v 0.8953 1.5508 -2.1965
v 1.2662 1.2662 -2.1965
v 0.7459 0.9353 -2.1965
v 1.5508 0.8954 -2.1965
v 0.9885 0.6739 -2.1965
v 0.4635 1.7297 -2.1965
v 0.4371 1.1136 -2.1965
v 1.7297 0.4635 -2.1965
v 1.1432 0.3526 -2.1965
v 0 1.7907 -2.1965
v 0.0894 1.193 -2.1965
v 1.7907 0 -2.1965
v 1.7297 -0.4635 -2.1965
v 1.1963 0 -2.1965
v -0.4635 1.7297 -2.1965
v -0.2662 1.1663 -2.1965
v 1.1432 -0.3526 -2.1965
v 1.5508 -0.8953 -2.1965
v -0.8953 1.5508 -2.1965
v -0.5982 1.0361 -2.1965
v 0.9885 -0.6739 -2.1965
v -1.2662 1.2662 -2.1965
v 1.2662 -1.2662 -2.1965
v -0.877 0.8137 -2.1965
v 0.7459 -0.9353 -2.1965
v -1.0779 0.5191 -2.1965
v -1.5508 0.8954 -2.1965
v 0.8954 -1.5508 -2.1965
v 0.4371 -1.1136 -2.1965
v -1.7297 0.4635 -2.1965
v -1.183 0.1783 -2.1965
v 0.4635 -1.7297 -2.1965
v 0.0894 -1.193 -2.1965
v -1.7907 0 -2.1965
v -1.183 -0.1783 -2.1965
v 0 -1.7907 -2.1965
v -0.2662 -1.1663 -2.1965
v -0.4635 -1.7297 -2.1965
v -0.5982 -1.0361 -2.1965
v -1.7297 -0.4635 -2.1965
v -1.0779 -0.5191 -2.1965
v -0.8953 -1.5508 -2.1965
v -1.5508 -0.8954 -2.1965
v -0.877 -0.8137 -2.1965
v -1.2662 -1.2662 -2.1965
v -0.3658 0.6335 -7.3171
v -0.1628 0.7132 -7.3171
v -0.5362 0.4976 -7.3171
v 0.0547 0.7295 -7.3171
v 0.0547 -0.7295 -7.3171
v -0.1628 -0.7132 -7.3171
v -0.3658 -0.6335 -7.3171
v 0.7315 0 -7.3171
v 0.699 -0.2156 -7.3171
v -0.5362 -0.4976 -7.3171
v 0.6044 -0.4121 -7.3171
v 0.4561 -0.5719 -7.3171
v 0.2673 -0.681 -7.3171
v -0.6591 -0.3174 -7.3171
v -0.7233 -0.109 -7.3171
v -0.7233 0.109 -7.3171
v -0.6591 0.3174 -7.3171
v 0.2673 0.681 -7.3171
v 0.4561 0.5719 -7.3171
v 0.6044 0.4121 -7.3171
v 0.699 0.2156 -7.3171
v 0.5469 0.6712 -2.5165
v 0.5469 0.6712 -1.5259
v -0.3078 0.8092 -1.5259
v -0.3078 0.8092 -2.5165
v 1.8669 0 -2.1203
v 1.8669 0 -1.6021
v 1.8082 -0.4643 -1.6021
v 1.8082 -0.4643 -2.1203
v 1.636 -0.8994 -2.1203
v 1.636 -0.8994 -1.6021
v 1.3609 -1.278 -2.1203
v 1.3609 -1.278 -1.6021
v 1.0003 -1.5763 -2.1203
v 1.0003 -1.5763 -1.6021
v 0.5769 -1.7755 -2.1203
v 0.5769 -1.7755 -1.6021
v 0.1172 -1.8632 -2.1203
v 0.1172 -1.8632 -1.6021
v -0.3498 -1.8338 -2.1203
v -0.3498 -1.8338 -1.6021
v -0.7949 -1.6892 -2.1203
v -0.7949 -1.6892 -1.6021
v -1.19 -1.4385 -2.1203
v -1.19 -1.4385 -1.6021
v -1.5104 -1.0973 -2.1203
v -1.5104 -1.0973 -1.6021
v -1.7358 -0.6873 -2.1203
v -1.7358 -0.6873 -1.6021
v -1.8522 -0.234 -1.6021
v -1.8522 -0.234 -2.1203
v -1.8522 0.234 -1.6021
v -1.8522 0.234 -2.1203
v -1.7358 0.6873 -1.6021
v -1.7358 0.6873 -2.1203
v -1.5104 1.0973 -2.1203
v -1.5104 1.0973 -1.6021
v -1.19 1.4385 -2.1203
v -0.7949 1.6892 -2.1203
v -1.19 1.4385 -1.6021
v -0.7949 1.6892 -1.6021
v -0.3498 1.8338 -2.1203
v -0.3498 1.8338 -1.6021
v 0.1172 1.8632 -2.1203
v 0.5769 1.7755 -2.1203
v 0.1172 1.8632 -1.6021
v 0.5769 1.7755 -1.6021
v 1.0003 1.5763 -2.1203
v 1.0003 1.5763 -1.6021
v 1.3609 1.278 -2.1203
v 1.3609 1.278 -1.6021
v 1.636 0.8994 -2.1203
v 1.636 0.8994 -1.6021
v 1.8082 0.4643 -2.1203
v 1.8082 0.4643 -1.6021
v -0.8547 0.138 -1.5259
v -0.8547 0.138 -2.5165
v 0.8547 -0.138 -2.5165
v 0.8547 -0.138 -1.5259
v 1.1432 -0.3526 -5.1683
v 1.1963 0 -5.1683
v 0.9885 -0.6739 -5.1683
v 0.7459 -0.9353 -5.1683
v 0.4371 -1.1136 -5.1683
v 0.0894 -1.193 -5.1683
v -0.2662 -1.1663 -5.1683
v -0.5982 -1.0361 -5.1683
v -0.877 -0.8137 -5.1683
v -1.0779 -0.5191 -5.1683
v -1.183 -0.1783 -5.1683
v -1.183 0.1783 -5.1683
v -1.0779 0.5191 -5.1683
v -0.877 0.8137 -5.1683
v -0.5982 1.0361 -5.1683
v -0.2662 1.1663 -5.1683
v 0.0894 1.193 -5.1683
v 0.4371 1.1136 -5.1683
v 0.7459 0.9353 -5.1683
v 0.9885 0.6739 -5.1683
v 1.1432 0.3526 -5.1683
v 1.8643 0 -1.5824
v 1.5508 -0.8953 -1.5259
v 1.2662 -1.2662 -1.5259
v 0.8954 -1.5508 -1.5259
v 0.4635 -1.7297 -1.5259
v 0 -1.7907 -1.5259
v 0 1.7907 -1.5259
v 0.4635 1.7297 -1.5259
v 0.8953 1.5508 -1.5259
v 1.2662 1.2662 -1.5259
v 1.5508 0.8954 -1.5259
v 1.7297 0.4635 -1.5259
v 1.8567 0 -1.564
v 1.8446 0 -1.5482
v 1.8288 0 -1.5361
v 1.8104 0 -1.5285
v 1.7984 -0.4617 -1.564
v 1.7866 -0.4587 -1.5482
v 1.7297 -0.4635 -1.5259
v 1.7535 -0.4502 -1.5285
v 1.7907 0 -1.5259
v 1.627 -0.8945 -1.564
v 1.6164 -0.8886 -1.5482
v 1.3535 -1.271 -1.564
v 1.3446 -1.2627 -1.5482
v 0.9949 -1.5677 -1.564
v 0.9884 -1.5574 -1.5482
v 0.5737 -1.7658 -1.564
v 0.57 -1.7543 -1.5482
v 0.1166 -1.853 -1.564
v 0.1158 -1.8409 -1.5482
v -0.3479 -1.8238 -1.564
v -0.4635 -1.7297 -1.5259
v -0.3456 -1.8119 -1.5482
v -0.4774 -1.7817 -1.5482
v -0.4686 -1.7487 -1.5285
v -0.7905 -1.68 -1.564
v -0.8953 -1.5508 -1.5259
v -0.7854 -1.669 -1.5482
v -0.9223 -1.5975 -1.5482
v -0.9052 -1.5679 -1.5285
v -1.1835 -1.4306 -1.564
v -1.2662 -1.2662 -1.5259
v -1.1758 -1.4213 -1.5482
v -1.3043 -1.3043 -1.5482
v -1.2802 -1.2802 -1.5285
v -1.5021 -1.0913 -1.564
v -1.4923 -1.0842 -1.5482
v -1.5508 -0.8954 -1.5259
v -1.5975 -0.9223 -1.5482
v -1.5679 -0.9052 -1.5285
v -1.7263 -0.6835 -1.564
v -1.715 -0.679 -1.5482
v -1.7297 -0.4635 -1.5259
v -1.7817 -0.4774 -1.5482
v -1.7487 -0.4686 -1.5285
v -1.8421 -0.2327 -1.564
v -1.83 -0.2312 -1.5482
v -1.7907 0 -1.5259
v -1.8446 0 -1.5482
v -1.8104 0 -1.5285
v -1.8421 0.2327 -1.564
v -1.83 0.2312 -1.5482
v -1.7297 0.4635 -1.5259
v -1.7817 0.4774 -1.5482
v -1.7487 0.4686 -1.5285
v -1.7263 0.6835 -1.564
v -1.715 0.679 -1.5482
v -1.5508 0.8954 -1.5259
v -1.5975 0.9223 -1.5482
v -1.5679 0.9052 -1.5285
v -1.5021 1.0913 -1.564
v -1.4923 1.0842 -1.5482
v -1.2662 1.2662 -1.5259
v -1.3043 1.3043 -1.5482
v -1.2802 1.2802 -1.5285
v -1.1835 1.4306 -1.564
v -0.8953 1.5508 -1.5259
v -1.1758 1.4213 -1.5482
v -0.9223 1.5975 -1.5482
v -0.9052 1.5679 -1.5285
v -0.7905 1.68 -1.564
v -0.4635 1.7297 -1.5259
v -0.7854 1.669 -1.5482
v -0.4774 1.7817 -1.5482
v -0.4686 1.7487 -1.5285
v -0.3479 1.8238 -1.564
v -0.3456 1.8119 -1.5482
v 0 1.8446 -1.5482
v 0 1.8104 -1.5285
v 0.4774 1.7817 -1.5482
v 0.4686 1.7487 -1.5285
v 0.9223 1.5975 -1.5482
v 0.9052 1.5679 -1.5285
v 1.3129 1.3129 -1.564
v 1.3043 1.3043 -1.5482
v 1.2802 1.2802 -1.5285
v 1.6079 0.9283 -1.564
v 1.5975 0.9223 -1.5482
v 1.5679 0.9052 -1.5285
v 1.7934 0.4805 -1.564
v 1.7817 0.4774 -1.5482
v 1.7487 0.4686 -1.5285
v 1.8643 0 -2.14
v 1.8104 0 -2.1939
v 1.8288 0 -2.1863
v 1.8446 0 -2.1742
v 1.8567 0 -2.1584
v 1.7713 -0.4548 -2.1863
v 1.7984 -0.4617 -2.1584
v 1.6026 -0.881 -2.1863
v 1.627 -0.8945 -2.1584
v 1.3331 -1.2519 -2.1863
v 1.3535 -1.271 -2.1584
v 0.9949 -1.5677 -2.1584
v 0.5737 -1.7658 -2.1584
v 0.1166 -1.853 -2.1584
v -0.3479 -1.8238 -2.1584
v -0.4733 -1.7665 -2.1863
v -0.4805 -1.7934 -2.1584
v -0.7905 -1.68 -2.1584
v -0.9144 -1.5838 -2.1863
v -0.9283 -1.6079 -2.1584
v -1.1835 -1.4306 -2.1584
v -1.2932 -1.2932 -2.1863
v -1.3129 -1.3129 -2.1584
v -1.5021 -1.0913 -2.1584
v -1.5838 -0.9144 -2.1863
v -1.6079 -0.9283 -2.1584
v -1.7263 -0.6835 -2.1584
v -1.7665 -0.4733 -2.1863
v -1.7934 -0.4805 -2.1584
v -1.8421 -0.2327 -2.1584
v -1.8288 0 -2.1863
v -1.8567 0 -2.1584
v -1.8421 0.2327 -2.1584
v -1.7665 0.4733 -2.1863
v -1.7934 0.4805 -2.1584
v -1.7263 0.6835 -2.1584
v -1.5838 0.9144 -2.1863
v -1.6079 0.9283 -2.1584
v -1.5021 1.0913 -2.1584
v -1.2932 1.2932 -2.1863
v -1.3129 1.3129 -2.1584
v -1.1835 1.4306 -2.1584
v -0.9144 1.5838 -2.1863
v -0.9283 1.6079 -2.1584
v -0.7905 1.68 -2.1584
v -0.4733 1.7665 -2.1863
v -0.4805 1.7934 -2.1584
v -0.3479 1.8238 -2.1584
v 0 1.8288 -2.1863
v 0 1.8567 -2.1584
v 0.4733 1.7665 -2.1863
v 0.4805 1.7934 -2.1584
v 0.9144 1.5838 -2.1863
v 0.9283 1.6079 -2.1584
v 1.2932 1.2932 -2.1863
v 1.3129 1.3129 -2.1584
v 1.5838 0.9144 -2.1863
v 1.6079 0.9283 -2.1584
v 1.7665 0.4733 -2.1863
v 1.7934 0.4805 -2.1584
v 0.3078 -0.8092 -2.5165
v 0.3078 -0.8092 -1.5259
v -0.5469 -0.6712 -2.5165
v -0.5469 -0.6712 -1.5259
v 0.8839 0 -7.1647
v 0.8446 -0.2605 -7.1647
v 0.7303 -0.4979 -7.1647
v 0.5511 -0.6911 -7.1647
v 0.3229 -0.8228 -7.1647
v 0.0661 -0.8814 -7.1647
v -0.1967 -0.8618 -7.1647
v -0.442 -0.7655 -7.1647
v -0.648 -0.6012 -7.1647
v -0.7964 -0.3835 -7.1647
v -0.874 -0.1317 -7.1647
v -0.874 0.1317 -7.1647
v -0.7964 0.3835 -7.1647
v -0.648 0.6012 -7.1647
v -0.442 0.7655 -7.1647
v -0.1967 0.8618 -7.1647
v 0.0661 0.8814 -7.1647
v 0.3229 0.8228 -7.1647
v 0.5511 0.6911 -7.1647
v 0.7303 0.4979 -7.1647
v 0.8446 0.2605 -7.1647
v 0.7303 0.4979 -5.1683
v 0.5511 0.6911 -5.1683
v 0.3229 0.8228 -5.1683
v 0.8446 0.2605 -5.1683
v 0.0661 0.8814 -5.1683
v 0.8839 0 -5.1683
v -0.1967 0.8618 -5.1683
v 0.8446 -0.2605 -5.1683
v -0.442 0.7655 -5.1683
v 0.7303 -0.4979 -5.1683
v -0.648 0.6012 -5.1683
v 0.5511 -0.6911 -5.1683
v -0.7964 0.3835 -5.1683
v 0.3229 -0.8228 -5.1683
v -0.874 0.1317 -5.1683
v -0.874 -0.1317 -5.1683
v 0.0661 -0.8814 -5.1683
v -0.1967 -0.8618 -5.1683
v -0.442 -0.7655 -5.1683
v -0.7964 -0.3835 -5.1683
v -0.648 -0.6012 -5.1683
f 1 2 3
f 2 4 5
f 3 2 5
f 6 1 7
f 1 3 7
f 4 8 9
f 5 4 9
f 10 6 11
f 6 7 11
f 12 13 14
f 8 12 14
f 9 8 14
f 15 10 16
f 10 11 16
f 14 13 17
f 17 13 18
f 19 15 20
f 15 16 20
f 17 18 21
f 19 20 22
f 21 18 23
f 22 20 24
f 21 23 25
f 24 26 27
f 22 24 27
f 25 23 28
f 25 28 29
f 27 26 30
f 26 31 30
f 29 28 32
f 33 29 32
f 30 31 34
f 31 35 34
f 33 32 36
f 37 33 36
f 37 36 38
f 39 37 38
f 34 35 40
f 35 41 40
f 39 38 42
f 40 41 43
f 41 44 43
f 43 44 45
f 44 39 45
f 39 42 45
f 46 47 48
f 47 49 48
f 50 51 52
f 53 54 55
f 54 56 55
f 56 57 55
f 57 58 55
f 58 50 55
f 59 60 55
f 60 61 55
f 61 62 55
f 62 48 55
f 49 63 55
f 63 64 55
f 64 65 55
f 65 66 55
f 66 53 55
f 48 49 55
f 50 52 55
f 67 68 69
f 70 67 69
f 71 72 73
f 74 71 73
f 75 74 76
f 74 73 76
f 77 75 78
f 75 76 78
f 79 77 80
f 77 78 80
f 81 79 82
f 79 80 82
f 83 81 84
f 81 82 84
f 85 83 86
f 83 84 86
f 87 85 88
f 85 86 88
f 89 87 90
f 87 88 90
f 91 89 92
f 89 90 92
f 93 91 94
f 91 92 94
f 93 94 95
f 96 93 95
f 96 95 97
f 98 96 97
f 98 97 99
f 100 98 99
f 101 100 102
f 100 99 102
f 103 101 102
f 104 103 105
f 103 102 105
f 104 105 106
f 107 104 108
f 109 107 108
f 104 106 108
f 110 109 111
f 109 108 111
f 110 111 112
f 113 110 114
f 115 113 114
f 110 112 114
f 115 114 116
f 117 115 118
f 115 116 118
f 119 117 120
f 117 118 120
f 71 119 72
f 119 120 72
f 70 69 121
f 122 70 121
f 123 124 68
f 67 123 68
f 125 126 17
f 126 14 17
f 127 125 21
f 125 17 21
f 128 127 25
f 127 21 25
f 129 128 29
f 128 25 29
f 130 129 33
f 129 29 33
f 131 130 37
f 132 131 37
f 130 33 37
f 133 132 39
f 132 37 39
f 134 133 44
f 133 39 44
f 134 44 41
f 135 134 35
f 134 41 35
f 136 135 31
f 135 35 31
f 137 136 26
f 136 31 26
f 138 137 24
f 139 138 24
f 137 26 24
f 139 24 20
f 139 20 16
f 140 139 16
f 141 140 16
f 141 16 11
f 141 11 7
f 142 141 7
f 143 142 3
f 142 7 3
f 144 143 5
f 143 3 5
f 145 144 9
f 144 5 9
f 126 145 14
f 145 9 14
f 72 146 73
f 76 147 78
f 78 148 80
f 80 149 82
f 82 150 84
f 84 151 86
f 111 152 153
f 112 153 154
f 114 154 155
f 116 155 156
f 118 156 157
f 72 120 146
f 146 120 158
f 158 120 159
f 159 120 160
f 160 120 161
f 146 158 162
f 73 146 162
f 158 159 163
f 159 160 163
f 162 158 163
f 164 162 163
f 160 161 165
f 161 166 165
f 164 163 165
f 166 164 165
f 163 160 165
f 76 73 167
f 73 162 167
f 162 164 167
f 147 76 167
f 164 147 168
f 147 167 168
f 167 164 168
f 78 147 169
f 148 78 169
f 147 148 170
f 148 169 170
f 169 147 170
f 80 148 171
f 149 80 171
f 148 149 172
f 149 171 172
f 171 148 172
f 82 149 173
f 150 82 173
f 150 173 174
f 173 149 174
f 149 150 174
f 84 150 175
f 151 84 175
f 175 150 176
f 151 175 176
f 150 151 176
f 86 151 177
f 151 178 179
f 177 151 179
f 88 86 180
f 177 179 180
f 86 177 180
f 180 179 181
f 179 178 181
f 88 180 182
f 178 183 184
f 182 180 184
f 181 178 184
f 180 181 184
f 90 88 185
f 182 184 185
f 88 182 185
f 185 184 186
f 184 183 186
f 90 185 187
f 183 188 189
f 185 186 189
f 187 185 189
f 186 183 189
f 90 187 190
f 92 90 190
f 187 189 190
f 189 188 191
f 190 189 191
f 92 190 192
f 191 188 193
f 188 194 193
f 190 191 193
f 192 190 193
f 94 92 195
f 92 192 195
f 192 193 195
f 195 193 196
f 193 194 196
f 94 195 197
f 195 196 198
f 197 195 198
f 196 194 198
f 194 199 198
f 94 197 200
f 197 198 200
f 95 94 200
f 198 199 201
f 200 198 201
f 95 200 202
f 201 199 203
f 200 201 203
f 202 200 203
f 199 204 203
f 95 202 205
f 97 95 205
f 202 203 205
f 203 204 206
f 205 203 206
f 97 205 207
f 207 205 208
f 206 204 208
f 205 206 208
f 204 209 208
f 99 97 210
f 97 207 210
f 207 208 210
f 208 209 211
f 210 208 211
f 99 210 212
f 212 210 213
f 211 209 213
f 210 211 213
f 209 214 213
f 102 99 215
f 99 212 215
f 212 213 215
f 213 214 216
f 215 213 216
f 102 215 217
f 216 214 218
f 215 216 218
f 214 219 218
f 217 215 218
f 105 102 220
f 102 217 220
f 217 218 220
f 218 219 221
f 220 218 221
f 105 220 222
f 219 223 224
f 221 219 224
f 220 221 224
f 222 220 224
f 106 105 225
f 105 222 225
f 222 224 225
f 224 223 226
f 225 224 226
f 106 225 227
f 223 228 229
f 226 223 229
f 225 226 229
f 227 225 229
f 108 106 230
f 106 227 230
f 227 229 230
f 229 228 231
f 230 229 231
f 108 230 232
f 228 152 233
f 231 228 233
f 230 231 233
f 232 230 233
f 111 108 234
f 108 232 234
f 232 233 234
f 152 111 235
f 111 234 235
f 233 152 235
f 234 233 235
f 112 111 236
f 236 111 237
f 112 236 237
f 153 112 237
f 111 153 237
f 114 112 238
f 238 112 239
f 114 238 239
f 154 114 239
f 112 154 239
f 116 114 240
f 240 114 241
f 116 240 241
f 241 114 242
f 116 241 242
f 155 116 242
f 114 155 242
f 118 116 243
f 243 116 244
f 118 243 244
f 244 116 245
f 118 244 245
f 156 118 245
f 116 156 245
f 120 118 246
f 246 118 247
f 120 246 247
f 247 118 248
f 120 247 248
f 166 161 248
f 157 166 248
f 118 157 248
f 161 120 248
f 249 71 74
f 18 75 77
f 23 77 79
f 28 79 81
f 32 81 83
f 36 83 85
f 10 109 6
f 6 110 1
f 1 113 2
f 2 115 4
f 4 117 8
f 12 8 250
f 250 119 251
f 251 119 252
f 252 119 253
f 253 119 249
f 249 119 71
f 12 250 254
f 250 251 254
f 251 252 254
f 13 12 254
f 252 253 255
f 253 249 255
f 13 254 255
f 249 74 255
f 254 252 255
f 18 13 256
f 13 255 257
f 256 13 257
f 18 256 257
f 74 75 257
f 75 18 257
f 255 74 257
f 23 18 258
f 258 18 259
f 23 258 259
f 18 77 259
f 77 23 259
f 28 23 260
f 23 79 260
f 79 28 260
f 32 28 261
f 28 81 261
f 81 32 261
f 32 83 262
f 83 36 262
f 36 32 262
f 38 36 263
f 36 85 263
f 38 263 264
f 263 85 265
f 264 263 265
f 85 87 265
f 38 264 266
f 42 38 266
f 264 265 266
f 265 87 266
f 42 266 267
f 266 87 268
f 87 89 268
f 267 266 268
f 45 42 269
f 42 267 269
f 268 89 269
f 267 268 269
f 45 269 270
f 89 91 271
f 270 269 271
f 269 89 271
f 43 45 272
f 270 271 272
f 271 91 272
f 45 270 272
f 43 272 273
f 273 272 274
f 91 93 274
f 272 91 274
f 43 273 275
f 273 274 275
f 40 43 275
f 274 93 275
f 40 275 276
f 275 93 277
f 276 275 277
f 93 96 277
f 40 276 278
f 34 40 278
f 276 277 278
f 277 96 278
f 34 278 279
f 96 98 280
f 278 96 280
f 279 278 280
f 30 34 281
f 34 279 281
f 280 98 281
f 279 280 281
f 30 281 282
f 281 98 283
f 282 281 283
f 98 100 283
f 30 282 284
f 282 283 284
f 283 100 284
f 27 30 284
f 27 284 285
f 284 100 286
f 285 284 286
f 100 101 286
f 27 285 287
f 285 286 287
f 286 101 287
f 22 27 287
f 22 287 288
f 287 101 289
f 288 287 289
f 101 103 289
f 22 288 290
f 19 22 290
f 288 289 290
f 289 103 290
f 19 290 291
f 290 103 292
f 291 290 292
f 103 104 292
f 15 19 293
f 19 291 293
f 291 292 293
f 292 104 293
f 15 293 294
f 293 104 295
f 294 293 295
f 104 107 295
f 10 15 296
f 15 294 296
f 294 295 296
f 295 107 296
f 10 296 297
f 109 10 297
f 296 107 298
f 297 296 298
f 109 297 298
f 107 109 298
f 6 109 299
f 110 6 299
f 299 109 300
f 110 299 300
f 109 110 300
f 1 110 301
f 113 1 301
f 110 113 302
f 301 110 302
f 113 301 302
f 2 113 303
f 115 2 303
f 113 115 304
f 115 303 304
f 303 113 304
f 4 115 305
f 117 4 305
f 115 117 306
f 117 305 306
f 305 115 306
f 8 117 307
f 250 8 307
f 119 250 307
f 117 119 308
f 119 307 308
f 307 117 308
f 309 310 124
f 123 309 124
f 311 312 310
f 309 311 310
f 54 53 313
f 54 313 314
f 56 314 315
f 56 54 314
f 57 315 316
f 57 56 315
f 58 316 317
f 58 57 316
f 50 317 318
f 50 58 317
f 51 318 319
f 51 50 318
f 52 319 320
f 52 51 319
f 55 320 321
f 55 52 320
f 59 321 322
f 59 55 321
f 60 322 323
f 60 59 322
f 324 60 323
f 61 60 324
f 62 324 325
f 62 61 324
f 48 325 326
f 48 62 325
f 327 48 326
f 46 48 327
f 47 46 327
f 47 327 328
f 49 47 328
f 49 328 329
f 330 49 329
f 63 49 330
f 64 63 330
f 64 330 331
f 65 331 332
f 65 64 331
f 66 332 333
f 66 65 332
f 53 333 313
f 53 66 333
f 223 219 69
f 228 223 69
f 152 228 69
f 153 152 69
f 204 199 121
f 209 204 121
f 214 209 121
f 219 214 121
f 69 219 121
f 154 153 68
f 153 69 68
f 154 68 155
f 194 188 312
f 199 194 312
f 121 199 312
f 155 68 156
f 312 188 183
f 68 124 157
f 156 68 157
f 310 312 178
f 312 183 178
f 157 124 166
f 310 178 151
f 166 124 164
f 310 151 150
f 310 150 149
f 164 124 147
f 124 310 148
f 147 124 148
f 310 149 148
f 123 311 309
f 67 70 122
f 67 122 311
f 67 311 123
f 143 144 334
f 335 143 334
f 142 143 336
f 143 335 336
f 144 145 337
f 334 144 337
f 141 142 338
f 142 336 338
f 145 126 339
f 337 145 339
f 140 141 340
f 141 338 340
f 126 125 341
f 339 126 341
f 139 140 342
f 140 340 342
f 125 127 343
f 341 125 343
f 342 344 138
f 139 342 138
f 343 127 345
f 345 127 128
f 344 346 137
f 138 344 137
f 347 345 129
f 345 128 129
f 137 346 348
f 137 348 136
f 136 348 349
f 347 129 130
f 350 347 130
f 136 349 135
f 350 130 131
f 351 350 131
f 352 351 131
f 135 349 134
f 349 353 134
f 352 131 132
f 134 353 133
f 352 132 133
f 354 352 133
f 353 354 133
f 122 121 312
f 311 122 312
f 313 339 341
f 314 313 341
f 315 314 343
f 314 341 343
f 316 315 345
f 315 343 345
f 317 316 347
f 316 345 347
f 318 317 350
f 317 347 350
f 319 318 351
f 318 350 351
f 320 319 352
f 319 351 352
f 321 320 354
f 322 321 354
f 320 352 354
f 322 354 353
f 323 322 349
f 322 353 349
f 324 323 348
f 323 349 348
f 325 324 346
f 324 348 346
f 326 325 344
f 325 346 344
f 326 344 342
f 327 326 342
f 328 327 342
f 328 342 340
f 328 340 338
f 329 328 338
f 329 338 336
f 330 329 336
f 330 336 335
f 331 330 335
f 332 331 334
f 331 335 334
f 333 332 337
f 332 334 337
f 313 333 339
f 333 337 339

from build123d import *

# Parameters (mm, degrees)
CUT_EXTRUDE1_DEPTH = 1.651
FILLET1_R          = 0.127
CHAMFER1_SIZE      = 0.254
SCALE1_SCALE       = 0.6


with BuildPart() as part:
    # Sketch1 → Revolve1 (revolve)
    with BuildSketch(Plane(origin=(0, 0, 0), x_dir=(0, 0, -1), z_dir=(1, 0, 0)), mode=Mode.PRIVATE) as revolve1_sk:
        Polygon((0, 0), (9.652, 0), (9.652, 1.4732), (6.0706, 1.4732), (6.0706, 1.9939), (1.1176, 1.9939), (1.1176, 3.1115), (0, 3.1115), align=None)
    revolve(revolve1_sk.sketch.rotate(Axis((0, 0, 0), (0, 0, -1)), 90), axis=Axis((0, 0, 0), (0, 0, -1)))

    # Sketch2 → Cut-Extrude1 (cut)
    with BuildSketch(Plane.XY):
        Polygon((-0.911507965, -1.118668866), (0.513041674, -1.348723487), (1.424549639, -0.23005462), (0.911507965, 1.118668866), (-0.513041674, 1.348723487), (-1.424549639, 0.23005462), align=None)
    extrude(amount=-CUT_EXTRUDE1_DEPTH, mode=Mode.SUBTRACT)

    # Fillet1
    fillet1_edges = [part.edges().sort_by_distance(p)[0] for p in [
        (-3.1115, 0, 0),
        (-3.1115, 0, -1.1176),
    ]]
    fillet(fillet1_edges, radius=FILLET1_R)

    # Chamfer1
    chamfer1_edges = [part.edges().sort_by_distance(p)[0] for p in [
        (-1.4732, 0, -9.652),
    ]]
    chamfer(chamfer1_edges, length=CHAMFER1_SIZE)


with BuildPart() as part_1:
    # Scale1: scaled about (0, 0, -3.814782306)
    add(part.part.scale(SCALE1_SCALE).moved(Location((0, 0, -1.525912922))))


solid = part_1.part
